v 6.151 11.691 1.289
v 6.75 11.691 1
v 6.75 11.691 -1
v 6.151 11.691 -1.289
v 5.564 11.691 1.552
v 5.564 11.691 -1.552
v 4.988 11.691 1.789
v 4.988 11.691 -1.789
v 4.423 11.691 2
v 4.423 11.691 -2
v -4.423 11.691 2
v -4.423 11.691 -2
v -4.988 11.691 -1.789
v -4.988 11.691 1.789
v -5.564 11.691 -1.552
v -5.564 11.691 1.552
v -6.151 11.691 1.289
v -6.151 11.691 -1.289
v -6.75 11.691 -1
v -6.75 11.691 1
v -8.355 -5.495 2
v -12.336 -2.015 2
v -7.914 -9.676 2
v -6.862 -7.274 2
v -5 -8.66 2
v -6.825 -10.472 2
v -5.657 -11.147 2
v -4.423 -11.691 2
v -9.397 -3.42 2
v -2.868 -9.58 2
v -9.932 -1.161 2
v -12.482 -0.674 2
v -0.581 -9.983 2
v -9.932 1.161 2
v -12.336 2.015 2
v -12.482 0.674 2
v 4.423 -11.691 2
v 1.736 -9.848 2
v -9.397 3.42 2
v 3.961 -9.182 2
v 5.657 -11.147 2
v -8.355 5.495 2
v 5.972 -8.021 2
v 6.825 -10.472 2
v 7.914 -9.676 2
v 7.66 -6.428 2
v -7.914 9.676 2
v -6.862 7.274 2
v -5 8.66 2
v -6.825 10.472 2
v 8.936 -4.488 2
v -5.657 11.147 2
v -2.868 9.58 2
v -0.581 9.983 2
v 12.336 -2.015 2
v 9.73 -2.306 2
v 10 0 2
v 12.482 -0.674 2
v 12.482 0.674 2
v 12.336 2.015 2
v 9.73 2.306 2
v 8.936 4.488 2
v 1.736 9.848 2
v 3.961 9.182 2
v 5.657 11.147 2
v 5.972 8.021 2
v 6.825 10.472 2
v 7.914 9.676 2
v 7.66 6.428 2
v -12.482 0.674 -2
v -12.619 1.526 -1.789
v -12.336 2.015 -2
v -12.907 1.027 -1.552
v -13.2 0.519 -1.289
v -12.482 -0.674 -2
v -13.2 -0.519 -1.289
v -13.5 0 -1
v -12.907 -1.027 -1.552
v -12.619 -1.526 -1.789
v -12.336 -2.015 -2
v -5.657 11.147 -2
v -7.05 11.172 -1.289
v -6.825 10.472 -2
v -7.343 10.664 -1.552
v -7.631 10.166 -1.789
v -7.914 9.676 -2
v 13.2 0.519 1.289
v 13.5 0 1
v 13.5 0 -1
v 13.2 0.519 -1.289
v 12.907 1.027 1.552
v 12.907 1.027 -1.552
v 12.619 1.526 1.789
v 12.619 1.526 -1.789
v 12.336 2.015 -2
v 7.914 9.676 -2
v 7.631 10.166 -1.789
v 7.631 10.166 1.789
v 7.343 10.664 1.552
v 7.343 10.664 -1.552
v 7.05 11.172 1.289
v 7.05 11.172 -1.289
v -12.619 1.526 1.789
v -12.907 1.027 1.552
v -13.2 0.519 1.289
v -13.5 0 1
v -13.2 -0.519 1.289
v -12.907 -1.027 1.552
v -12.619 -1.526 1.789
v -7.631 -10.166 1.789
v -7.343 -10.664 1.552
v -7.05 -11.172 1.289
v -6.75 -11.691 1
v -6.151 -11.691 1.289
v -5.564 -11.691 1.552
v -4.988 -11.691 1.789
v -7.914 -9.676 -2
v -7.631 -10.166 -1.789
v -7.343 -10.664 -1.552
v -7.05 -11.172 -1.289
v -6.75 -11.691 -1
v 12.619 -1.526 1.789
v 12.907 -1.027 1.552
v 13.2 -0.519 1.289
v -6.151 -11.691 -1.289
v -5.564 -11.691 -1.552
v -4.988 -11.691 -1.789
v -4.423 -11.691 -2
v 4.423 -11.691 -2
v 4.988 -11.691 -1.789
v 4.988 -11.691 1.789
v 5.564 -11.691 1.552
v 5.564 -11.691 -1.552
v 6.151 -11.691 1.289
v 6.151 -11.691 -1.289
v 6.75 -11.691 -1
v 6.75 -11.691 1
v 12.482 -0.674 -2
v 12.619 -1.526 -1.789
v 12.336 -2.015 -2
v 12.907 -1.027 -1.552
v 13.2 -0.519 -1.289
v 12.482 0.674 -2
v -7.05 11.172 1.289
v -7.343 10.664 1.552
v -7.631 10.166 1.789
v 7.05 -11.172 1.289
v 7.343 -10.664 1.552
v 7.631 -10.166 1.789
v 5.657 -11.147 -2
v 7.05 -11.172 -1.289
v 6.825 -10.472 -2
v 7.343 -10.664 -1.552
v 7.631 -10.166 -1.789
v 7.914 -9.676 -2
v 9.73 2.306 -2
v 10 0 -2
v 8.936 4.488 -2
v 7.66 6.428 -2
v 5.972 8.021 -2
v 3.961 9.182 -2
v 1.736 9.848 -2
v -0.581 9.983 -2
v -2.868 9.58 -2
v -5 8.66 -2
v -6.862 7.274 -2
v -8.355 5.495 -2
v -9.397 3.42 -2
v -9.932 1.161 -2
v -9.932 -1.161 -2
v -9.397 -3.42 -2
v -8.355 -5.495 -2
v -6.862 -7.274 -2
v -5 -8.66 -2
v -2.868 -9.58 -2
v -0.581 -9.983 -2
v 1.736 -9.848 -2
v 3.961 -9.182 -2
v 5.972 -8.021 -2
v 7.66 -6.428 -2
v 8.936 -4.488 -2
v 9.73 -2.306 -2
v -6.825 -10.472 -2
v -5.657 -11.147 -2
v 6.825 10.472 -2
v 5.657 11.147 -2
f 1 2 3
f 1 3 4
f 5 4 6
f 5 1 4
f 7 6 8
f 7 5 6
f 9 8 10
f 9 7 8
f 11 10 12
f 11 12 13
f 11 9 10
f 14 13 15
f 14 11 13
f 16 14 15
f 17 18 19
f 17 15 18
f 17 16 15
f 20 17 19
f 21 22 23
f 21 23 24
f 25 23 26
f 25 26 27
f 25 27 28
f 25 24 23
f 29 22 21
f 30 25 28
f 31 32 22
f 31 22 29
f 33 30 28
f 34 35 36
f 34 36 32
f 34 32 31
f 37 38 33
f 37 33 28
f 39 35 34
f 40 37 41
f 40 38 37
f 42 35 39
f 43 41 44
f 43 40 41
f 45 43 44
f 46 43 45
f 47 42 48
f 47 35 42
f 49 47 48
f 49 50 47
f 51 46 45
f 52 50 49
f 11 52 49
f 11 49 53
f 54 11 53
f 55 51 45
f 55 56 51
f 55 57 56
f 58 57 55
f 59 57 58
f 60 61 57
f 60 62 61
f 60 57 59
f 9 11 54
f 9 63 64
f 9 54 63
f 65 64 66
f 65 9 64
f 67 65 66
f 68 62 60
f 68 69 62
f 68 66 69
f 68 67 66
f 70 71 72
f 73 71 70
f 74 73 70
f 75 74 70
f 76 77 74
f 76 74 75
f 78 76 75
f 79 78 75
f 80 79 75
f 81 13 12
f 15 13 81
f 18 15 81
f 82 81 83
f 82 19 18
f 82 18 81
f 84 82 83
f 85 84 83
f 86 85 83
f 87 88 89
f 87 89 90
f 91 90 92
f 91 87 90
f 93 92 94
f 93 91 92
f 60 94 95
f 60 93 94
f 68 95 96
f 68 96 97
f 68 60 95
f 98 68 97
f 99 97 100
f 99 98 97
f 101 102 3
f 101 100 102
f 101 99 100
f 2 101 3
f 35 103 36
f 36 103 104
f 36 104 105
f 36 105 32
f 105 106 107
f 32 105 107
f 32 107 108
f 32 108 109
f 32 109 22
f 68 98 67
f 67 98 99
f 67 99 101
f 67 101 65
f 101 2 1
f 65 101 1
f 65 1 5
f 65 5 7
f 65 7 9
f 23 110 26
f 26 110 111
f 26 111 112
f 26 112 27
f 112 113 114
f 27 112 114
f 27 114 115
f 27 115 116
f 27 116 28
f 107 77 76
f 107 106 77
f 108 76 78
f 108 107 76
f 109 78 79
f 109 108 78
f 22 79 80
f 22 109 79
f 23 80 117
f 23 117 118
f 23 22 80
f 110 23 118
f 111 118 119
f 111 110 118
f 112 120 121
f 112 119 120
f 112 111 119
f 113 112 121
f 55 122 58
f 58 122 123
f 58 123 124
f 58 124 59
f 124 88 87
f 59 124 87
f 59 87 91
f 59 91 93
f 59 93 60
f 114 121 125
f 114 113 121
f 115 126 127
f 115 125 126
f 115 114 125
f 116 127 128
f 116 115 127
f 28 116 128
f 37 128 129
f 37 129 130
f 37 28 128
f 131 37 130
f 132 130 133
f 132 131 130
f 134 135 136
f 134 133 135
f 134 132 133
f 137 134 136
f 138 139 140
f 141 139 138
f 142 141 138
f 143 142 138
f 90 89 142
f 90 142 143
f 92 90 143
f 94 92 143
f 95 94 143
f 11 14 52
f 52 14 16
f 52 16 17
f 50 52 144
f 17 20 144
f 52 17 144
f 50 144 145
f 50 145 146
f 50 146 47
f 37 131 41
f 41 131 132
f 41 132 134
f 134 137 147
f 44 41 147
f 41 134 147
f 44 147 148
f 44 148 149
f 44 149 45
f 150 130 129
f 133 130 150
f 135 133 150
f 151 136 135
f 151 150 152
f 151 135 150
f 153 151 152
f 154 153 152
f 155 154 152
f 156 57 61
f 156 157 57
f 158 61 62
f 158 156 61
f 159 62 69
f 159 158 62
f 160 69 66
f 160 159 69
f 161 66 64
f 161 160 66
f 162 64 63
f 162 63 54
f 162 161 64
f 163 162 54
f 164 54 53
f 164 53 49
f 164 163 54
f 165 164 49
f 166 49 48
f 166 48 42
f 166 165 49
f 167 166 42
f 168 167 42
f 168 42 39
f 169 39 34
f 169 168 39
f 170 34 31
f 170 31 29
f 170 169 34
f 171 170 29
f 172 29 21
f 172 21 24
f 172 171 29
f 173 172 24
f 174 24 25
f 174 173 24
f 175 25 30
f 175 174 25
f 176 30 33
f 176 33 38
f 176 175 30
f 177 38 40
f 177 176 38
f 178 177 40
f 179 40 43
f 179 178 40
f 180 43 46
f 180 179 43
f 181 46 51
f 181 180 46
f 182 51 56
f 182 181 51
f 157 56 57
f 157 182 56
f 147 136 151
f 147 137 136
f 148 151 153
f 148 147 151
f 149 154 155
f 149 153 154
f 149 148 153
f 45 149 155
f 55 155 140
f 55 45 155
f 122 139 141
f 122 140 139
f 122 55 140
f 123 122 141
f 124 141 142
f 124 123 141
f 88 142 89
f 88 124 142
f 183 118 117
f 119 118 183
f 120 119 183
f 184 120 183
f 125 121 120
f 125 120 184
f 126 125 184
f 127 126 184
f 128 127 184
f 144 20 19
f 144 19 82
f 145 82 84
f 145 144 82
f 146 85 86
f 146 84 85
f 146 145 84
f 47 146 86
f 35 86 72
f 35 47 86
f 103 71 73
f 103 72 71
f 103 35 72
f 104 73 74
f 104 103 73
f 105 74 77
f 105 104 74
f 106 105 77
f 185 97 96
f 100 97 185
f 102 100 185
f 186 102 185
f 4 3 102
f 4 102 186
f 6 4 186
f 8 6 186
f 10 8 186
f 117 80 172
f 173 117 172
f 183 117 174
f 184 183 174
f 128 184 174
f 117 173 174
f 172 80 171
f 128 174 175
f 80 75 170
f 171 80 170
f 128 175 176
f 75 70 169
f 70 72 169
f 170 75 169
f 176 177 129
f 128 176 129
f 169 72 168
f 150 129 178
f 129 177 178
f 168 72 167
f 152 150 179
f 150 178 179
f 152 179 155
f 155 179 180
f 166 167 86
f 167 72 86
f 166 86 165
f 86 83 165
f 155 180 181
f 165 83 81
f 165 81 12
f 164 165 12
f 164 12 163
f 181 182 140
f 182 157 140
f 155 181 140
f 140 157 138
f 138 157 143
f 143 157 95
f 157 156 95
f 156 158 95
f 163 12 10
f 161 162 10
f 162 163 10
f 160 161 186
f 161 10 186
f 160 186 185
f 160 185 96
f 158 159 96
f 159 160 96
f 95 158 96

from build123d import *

# Parameters (mm, degrees)
SKETCH1_R           = 10
BOSS_EXTRUDE1_DEPTH = 2


with BuildPart() as part:
    # Sketch1 → Boss-Extrude1 (new, symmetric)
    with BuildSketch(Plane.XY):
        Polygon((6.75, -11.691342951), (13.5, 0), (6.75, 11.691342951), (-6.75, 11.691342951), (-13.5, 0), (-6.75, -11.691342951), align=None)
        Circle(SKETCH1_R, mode=Mode.SUBTRACT)
    extrude(amount=BOSS_EXTRUDE1_DEPTH, both=True)

    # Sketch4 → Cut-Revolve1 (revolve, cut)
    with BuildSketch(Plane(origin=(0, 0, 0), x_dir=(1, 0, 0), z_dir=(0, 1, 0))):
        Polygon((-13.5, 2), (-12.5, 2), (-13.5, 1), align=None)
    cut_revolve1 = revolve(axis=Axis((0, 0, -2), (0, 0, 1)), mode=Mode.SUBTRACT)

    # Mirror1: Cut-Revolve1 across plane
    add(cut_revolve1.mirror(Plane.XY), mode=Mode.SUBTRACT)


solid = part.part
